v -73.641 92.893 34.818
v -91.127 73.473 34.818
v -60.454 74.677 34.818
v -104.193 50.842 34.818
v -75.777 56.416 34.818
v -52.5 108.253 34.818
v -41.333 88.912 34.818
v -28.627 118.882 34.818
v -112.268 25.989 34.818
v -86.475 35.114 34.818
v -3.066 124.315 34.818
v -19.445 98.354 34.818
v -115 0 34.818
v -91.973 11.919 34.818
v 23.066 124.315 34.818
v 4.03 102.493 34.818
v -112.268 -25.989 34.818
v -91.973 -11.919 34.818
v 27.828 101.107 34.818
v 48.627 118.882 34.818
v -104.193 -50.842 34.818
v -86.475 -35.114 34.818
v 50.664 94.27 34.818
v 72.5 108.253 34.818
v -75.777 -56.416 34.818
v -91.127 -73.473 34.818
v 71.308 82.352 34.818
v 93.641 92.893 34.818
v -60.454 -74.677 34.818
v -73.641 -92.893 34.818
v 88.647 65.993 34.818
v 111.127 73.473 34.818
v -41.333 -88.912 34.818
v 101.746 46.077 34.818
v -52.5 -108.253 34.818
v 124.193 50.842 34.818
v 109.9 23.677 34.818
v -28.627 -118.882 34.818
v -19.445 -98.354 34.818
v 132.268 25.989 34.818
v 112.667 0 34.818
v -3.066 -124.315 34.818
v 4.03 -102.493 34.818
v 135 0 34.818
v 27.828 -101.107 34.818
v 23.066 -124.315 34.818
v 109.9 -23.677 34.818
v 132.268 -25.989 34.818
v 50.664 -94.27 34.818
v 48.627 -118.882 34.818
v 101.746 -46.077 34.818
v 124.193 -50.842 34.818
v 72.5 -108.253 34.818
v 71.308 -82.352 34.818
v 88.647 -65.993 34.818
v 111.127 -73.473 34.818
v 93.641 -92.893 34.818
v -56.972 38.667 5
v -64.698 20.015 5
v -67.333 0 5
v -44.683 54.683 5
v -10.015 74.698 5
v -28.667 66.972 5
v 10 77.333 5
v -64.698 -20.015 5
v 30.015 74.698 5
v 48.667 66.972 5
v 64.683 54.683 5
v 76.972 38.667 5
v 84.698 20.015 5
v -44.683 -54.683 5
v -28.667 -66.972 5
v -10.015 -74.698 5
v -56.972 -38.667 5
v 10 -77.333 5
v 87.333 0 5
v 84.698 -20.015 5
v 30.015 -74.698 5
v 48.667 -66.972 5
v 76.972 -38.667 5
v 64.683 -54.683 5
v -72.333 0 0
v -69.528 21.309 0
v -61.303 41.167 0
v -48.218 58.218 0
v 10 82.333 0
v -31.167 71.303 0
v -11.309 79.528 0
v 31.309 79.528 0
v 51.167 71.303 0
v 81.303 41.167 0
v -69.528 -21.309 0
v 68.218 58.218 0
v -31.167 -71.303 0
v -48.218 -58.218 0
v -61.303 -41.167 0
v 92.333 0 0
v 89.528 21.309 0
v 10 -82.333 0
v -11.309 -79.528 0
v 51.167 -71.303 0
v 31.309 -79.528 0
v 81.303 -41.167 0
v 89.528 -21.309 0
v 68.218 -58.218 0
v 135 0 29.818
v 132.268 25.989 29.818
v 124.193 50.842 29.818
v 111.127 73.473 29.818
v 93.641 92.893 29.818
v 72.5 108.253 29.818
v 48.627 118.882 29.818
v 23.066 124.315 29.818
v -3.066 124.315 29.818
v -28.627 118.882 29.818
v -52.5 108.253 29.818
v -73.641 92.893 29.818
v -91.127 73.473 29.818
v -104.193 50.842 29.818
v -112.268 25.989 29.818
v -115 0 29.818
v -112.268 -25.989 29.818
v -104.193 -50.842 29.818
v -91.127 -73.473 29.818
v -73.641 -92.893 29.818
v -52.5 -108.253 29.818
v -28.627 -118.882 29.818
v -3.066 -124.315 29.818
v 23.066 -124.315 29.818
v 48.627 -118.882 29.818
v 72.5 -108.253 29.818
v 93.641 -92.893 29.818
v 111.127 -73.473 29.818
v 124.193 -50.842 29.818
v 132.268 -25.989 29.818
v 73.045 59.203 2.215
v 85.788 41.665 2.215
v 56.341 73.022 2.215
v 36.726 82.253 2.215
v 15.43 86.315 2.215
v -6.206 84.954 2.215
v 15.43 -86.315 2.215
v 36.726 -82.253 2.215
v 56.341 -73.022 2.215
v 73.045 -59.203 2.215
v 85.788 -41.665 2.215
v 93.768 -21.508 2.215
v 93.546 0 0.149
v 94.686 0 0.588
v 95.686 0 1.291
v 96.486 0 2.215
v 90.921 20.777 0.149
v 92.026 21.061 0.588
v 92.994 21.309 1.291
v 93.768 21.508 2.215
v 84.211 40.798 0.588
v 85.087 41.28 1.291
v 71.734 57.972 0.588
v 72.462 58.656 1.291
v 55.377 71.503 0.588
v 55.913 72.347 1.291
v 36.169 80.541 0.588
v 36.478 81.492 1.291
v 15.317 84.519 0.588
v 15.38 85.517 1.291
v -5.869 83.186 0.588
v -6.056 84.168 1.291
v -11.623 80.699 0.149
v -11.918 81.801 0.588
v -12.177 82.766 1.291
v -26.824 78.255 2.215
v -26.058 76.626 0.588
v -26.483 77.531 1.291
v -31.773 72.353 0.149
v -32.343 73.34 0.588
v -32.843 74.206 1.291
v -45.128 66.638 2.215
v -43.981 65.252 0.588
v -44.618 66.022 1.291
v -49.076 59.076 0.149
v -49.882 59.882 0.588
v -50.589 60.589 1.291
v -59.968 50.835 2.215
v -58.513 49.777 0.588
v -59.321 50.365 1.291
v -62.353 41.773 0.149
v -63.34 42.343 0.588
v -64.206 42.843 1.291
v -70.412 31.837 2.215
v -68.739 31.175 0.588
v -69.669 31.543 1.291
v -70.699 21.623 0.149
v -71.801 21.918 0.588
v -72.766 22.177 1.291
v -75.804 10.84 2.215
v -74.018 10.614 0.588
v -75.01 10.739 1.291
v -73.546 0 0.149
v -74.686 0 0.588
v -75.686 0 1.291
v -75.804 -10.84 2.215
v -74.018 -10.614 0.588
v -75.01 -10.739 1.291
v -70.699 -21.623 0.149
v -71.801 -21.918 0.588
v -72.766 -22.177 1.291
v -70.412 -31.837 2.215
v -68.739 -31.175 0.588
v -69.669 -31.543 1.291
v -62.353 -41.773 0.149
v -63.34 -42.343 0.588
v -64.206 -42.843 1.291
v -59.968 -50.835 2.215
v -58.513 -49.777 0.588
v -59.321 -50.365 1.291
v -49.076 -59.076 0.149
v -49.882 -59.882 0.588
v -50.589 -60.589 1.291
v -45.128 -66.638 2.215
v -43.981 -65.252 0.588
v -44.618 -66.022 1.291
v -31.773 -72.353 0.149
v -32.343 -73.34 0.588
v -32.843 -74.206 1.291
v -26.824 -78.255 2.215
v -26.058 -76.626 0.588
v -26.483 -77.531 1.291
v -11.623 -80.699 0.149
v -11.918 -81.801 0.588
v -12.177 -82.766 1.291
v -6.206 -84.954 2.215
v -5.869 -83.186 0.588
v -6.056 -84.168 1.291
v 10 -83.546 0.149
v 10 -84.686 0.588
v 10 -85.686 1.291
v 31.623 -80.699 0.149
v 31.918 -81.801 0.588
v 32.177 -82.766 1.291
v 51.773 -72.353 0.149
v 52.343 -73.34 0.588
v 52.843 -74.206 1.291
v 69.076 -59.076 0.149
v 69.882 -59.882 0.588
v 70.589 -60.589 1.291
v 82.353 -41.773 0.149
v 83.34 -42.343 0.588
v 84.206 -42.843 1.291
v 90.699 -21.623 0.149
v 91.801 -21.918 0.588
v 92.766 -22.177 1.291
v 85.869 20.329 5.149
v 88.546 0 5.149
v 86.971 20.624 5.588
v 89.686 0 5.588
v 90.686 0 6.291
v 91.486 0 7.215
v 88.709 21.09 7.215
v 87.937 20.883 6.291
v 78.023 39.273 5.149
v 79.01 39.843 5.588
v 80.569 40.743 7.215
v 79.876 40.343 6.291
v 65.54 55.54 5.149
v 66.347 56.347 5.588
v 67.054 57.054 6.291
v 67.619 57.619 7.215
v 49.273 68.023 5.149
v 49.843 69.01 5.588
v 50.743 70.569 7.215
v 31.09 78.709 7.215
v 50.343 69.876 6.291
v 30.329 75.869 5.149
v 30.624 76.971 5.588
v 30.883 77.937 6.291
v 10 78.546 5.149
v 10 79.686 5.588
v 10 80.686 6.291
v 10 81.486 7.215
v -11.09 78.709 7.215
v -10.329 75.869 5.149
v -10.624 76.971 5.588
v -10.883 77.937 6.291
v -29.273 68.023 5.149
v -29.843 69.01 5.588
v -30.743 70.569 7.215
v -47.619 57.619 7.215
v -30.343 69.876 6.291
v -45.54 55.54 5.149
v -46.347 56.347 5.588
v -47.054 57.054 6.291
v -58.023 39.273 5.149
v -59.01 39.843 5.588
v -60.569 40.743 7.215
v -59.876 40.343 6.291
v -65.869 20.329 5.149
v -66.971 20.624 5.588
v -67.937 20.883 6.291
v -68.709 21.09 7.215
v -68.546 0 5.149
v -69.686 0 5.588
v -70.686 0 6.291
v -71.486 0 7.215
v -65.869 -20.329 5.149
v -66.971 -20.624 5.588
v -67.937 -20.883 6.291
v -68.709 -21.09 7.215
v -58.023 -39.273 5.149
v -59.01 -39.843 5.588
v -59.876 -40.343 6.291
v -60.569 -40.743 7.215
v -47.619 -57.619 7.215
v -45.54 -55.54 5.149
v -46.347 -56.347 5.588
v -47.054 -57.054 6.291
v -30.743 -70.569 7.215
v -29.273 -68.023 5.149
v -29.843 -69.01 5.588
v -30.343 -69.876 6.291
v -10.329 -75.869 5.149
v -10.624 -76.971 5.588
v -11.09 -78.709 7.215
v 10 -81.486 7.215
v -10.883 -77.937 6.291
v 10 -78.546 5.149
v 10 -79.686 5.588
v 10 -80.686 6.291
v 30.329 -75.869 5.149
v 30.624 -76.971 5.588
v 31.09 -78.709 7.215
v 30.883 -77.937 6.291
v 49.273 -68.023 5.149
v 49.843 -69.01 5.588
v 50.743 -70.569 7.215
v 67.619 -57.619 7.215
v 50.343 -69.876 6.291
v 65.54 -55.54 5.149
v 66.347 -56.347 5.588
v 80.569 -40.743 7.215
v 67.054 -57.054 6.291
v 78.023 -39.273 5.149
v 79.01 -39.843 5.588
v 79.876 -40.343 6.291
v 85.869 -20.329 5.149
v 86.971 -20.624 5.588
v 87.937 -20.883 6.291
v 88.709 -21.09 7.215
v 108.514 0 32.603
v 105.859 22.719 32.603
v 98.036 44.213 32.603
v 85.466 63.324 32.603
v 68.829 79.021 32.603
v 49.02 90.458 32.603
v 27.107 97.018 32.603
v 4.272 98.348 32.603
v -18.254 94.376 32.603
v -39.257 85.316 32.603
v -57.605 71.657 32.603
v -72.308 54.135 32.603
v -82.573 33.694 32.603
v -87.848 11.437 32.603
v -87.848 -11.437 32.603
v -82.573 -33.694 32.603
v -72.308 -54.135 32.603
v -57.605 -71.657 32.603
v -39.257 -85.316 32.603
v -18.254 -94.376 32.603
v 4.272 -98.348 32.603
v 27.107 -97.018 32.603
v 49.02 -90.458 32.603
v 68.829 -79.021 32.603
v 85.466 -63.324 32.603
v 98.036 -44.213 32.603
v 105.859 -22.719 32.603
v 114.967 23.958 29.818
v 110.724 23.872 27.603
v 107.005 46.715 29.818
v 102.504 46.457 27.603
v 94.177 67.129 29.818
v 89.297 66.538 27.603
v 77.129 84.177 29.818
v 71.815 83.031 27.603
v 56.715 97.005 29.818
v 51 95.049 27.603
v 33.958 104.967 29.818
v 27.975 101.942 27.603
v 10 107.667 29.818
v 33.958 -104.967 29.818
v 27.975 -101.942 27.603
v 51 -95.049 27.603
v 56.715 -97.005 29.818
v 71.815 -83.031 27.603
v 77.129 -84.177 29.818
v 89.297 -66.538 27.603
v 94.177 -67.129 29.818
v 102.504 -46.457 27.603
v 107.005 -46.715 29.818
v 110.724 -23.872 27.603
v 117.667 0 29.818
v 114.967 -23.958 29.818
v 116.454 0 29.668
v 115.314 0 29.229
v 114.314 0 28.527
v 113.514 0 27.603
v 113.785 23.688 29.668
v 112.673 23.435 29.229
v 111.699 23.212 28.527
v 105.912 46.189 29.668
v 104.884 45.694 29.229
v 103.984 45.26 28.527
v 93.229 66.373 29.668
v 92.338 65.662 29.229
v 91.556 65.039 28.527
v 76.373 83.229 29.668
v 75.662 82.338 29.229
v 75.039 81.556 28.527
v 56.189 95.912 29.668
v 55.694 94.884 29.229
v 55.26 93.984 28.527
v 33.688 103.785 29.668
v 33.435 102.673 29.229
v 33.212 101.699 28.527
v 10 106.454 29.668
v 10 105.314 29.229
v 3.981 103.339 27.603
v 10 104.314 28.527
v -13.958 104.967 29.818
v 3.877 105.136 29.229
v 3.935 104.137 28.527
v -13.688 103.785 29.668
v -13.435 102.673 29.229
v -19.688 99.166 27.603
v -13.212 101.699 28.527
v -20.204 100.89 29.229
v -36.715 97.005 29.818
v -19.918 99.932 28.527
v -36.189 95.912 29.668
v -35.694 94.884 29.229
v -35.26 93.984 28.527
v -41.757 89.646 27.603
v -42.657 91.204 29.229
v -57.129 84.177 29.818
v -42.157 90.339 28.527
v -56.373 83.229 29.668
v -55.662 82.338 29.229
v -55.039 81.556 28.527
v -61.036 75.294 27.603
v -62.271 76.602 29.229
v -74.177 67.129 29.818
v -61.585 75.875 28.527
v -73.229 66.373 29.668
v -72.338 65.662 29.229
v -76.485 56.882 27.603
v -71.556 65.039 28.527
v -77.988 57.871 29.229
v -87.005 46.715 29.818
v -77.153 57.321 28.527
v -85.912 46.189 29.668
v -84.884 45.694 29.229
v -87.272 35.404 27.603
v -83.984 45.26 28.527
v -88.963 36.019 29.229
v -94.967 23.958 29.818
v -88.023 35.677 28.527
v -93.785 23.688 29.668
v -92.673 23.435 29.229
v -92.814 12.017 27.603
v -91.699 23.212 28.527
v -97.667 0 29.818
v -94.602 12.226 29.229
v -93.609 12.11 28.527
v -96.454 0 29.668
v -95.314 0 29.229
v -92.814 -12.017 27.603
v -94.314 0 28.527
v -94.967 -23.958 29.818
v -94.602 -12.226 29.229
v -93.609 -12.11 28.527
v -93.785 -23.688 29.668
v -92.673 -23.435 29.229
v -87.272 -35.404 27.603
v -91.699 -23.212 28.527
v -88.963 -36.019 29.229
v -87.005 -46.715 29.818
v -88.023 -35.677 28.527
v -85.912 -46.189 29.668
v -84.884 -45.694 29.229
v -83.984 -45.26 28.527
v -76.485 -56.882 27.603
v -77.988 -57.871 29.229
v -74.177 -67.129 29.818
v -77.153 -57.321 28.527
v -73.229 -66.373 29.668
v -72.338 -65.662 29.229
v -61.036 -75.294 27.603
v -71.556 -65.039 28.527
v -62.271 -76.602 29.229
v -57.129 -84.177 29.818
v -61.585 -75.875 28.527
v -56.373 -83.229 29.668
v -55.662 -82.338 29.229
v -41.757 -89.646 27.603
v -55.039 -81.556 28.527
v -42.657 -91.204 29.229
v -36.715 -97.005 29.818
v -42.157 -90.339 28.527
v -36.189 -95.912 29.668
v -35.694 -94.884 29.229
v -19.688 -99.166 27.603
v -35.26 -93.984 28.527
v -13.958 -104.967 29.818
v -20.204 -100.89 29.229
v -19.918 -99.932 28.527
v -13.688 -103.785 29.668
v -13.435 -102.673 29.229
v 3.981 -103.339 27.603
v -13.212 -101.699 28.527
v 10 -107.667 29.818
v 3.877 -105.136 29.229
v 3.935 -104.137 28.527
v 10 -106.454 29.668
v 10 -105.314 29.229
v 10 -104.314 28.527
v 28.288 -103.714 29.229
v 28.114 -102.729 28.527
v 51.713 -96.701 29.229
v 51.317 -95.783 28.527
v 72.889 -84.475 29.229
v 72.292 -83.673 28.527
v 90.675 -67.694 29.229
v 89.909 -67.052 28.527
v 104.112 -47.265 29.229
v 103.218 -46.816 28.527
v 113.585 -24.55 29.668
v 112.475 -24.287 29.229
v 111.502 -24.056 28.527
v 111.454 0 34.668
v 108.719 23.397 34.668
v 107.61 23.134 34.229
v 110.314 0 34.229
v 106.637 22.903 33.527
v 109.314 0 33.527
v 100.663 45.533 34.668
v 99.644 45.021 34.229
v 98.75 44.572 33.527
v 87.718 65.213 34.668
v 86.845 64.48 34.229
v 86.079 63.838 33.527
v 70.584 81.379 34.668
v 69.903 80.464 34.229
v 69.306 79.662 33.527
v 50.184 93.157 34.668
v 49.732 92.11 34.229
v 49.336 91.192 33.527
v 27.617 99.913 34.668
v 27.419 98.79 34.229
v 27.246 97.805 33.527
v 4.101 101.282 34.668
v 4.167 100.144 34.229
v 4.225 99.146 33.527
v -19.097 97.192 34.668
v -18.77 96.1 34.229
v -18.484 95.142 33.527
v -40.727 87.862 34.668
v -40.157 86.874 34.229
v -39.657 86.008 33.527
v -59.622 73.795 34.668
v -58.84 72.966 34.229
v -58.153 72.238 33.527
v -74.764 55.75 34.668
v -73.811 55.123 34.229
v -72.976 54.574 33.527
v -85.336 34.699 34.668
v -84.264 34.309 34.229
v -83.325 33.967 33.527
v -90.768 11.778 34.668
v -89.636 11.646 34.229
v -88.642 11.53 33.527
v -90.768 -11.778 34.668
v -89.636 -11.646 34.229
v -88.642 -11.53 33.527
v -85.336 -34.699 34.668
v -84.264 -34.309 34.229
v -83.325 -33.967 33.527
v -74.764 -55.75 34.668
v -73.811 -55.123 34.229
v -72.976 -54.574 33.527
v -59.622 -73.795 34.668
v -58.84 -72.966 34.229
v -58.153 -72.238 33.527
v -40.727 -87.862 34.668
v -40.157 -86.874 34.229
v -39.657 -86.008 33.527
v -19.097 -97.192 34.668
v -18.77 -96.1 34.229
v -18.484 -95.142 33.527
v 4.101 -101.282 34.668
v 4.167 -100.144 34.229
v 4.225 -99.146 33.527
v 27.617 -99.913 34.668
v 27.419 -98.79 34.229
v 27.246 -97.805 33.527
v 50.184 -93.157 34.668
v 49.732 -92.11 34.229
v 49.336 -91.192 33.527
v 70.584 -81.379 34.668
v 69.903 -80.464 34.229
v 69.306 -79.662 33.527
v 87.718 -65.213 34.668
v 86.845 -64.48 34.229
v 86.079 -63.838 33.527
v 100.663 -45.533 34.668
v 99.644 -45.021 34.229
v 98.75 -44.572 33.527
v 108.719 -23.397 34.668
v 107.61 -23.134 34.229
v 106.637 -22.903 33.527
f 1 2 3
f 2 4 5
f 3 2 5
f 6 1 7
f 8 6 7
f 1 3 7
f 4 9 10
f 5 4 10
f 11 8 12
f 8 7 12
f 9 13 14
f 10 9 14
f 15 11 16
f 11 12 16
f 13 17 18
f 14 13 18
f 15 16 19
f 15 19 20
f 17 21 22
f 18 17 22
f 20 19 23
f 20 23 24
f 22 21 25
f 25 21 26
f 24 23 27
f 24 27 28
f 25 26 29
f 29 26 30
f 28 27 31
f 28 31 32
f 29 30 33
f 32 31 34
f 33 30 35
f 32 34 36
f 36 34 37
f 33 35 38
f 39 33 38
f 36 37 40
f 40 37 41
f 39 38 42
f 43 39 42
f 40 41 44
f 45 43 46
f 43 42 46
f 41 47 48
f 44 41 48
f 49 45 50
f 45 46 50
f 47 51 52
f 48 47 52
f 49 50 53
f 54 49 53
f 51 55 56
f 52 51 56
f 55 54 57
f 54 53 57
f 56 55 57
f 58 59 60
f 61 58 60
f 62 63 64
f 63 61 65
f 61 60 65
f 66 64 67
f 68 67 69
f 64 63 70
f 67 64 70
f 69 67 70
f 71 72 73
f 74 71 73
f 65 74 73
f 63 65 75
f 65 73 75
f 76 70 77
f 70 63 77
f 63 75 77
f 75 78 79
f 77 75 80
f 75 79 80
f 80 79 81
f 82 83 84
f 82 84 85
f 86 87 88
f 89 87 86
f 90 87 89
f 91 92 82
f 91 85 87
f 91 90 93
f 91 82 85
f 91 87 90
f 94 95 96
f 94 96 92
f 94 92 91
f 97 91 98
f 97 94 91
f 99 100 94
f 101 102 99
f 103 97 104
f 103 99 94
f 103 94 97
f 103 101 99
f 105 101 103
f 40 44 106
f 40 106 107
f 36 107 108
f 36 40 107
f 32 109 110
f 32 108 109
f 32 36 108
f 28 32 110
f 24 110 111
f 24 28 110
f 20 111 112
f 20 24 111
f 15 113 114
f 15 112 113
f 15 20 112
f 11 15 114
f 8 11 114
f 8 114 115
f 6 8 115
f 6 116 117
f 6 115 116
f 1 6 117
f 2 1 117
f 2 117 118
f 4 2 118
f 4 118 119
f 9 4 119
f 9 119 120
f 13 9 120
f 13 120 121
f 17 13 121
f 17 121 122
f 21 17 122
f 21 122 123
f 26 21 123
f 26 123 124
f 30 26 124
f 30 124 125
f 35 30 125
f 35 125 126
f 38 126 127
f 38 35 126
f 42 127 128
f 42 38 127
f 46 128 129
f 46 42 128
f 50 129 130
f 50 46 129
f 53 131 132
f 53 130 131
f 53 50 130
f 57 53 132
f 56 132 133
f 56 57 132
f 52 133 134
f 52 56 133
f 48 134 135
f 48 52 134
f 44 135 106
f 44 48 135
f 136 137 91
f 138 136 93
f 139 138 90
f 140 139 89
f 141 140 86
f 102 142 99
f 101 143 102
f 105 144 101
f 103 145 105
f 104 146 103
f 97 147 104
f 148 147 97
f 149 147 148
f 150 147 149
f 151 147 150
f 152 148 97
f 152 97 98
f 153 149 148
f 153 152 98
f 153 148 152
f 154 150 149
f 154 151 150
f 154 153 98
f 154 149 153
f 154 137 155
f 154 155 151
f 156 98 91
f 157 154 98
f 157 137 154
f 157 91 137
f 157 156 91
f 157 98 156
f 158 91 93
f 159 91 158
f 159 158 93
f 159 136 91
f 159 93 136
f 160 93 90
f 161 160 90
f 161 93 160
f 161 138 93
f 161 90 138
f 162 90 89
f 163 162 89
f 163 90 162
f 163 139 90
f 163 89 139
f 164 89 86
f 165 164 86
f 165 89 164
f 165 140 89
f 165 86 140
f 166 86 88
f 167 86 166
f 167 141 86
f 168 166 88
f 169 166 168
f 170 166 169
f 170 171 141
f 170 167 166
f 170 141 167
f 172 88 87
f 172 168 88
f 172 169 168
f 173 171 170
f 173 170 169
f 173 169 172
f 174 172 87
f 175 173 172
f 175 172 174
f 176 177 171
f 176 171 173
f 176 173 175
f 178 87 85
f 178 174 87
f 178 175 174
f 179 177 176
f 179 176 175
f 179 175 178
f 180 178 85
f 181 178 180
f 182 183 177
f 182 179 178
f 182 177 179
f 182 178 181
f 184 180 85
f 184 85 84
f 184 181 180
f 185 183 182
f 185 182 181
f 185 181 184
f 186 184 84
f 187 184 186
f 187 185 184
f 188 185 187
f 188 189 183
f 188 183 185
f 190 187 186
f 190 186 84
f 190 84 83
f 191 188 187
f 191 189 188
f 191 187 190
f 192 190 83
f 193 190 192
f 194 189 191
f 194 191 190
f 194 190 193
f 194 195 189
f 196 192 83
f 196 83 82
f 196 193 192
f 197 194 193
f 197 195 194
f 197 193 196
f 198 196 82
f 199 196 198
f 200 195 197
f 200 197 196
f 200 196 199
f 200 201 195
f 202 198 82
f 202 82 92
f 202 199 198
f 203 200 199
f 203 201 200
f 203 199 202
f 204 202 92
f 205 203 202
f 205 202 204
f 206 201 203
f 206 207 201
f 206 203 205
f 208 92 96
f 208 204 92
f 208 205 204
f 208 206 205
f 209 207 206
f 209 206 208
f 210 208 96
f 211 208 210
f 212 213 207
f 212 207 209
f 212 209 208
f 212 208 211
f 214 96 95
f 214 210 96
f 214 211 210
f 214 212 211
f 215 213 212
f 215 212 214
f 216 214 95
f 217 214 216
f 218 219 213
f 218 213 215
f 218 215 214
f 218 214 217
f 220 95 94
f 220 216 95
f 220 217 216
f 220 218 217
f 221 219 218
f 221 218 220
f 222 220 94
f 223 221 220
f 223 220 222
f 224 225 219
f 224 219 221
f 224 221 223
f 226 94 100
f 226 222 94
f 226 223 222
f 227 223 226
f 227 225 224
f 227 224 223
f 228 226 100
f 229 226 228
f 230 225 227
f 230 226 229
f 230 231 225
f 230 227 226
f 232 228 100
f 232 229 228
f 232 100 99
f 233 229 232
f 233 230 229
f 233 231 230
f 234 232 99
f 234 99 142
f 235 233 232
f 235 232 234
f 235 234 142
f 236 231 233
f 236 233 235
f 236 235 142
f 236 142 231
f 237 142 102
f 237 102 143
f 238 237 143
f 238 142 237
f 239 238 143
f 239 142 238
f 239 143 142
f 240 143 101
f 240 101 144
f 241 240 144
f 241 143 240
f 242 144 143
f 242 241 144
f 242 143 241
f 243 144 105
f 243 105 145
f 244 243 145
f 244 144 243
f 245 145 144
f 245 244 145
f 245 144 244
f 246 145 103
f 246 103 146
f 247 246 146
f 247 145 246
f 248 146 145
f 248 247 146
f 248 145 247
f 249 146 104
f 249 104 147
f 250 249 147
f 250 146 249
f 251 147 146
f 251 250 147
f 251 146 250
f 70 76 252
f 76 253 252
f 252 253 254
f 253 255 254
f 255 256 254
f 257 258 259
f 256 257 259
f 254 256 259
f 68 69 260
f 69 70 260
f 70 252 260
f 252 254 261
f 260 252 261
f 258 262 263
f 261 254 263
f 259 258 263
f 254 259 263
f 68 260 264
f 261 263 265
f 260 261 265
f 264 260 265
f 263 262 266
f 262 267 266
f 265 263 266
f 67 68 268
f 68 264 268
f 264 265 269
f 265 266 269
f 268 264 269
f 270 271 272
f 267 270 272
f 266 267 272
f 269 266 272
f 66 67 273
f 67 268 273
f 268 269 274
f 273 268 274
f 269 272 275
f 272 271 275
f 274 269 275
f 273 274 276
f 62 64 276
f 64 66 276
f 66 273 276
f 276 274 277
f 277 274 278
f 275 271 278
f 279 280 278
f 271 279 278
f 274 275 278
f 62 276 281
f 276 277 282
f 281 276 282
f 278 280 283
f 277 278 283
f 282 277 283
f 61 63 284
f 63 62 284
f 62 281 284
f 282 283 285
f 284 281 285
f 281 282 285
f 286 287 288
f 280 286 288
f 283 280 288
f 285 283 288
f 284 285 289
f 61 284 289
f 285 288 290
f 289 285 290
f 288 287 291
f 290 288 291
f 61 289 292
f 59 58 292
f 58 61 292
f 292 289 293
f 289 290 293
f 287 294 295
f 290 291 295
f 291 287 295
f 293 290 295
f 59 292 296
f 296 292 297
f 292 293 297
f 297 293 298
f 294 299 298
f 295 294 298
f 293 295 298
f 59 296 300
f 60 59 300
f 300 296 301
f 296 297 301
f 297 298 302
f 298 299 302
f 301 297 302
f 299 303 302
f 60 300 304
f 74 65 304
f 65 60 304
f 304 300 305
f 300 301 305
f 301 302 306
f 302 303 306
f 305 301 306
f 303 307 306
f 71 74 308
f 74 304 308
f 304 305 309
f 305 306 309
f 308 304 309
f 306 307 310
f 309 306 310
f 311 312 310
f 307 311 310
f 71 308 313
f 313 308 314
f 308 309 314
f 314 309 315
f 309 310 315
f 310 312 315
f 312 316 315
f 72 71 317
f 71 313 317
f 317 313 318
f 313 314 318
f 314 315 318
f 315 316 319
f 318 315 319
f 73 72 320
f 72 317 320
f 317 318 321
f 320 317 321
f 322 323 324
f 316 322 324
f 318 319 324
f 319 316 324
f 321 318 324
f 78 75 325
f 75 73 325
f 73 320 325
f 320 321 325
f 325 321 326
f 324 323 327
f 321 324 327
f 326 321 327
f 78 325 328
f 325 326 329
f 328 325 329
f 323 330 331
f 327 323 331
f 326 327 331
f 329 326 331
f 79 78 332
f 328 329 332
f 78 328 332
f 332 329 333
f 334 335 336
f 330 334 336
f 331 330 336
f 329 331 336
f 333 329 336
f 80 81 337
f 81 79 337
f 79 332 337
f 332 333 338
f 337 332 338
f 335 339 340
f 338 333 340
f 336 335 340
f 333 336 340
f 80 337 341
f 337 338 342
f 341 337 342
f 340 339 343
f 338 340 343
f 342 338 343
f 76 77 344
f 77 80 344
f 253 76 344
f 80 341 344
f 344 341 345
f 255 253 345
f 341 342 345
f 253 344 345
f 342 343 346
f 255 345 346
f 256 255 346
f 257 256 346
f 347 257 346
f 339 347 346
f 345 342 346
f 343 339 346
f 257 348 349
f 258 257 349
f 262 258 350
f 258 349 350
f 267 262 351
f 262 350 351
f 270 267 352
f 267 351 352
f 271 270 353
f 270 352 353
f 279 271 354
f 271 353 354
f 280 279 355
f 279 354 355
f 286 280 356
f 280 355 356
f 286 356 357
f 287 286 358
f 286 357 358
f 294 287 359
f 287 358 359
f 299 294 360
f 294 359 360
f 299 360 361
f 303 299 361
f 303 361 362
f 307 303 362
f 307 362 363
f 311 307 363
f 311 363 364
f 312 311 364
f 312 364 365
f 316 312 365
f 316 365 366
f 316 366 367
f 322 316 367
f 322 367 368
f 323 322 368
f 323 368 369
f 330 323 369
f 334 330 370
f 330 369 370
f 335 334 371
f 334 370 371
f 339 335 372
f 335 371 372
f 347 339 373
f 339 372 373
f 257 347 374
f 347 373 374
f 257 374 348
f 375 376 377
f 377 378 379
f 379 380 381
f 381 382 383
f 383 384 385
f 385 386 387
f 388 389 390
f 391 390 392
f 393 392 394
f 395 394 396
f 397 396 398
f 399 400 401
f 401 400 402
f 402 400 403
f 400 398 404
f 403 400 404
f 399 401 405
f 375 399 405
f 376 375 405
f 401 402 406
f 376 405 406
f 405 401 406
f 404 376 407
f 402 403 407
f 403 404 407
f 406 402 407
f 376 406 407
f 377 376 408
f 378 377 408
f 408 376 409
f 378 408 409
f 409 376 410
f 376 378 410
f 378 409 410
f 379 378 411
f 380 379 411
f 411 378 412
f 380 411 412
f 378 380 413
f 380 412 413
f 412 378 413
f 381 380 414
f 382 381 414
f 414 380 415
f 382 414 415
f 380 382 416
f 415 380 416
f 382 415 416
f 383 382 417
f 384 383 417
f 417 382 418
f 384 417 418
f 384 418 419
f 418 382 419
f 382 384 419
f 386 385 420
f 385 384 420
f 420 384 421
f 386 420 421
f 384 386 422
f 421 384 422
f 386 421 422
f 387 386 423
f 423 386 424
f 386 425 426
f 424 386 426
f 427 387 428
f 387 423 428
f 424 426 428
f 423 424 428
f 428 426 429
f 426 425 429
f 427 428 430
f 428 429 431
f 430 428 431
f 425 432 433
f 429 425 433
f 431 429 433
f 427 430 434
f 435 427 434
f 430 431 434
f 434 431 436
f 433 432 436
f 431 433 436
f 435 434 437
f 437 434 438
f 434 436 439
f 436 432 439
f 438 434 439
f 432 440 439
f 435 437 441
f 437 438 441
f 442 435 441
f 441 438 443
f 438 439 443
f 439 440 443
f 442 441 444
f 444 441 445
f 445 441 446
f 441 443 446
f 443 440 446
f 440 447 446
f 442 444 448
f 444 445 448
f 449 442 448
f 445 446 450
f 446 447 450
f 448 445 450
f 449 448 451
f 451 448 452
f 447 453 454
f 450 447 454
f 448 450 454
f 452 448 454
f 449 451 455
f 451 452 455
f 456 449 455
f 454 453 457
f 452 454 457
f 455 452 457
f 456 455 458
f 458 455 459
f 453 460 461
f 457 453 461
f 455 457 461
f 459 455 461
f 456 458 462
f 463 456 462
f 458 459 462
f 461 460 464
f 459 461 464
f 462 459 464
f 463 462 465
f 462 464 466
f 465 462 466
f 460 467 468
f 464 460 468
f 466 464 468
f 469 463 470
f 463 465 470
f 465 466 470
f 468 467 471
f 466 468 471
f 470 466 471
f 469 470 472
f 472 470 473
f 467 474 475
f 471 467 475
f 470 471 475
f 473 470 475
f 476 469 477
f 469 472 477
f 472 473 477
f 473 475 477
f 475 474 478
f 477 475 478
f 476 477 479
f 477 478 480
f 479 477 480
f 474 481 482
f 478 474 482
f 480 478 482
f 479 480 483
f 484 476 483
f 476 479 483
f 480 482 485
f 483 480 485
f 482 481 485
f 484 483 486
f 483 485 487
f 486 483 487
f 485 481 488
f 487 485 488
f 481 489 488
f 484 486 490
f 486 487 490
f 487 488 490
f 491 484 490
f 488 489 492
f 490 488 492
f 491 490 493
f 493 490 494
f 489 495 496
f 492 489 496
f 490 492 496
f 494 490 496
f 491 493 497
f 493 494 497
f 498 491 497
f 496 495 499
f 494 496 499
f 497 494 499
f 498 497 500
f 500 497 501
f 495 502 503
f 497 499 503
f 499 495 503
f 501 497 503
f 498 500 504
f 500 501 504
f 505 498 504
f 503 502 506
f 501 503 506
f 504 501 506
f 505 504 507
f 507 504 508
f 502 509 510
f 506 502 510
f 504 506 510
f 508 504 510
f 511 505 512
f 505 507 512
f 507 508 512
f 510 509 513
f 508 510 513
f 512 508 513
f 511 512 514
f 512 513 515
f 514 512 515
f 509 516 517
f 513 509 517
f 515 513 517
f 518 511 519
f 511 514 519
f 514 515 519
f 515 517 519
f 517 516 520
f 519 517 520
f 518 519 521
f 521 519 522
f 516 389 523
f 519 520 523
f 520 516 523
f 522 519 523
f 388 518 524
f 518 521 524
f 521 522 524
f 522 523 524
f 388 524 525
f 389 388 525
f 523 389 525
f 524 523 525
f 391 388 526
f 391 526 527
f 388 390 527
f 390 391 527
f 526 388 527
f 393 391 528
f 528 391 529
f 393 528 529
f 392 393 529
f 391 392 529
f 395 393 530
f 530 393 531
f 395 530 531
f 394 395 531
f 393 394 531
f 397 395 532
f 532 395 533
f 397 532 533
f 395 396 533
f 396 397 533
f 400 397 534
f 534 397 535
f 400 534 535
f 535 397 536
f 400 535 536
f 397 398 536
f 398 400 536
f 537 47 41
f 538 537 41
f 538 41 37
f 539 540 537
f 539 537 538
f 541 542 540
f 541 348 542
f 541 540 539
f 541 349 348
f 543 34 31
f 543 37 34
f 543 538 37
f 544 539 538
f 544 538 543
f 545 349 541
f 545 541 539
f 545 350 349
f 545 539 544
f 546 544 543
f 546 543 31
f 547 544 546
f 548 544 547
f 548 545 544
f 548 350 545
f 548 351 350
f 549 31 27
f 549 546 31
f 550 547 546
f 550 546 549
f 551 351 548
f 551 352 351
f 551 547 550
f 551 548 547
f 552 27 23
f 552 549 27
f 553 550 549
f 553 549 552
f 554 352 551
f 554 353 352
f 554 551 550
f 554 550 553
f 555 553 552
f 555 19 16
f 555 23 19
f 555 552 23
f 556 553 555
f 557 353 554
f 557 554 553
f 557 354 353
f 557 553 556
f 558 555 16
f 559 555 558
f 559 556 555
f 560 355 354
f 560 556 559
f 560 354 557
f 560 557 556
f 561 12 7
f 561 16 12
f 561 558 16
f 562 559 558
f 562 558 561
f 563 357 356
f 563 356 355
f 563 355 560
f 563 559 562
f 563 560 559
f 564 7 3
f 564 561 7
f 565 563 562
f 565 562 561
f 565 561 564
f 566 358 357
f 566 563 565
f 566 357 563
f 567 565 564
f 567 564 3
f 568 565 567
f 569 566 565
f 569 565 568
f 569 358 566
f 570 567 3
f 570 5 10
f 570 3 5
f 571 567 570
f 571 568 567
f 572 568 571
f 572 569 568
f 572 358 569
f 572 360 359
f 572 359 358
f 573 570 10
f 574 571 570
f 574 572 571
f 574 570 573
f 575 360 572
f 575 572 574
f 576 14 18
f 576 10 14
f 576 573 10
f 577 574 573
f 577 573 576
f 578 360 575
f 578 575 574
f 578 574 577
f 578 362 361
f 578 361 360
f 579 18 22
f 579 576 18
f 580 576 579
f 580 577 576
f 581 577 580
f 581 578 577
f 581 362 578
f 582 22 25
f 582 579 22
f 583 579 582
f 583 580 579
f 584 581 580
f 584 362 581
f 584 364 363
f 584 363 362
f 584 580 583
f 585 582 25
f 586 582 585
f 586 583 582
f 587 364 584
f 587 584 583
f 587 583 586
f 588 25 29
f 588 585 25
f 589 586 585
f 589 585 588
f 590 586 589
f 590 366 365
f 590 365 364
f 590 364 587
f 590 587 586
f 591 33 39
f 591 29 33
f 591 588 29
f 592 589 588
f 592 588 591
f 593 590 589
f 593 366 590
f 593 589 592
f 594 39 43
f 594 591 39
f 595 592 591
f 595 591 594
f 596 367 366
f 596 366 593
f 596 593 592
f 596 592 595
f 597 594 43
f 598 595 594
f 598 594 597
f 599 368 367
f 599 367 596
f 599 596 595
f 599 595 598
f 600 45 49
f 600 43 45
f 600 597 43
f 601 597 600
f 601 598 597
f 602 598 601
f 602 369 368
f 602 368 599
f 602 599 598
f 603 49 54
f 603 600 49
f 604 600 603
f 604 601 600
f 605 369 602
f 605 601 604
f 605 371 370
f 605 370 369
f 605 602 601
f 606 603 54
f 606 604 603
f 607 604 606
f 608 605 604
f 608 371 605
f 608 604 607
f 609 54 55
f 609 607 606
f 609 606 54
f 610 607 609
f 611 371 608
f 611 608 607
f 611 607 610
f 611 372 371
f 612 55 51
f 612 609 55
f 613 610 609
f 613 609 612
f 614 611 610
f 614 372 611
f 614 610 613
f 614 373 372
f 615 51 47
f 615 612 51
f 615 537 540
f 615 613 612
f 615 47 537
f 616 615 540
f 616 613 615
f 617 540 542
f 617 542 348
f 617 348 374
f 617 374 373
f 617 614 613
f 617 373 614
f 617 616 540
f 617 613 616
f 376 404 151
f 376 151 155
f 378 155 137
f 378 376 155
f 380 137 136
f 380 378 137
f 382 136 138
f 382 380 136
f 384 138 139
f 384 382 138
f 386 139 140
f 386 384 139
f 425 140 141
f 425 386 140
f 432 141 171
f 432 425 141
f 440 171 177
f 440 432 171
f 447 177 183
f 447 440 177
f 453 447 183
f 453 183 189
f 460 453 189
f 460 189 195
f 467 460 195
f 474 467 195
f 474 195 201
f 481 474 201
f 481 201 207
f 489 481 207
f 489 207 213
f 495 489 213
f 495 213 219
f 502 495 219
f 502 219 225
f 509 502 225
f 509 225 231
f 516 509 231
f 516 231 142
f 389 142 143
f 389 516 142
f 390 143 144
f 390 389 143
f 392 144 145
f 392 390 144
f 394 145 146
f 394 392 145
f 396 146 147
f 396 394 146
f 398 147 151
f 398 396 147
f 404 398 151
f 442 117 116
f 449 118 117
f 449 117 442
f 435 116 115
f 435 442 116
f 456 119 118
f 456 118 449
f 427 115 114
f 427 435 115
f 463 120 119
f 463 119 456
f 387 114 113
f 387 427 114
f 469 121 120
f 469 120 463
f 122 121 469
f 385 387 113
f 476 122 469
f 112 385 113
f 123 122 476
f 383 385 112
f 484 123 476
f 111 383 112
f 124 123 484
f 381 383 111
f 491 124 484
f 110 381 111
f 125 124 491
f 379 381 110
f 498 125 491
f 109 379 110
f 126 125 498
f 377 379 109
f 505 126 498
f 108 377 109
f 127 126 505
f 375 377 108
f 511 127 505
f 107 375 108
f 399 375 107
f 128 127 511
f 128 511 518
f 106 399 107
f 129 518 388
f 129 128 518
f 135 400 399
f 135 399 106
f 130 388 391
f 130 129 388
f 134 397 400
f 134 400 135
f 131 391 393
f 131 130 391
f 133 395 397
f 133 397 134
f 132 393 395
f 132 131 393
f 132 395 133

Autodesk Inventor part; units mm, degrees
ref_plane "YZ Plane" through (0, 0, 0) normal (1, 0, 0) x (0, 1, 0)
ref_plane "XZ Plane" through (0, 0, 0) normal (0, 1, 0) x (-1, 0, 0)
ref_plane "XY Plane" through (0, 0, 0) normal (0, 0, 1) x (1, 0, 0)
sketch "Boceto3" plane through (0, 0, 0) normal (0, 0, 1) x (1, 0, 0)
  line L0 (0, 0) -> (82.3331, 0)
  line L1 (86.4856, 2.2148) -> (103.5144, 27.6027)
  line L2 (107.6669, 29.8175) -> (125, 29.8175)
  line L3 (125, 29.8175) -> (125, 34.8175)
  line L4 (125, 34.8175) -> (102.6669, 34.8175)
  line L5 (98.5144, 32.6027) -> (81.4856, 7.2148)
  line L6 (77.3331, 5) -> (0, 5)
  line L7 (0, 5) -> (0, 0)
  arc A0 (77.3331, 5) -> (81.4856, 7.2148) centre (77.3331, 10) ccw
  arc A1 (102.6669, 34.8175) -> (98.5144, 32.6027) centre (102.6669, 29.8175) ccw
  arc A2 (107.6669, 29.8175) -> (103.5144, 27.6027) centre (107.6669, 24.8175) ccw
  arc A3 (82.3331, 0) -> (86.4856, 2.2148) centre (82.3331, 5) ccw
  point P0 (85, 0)
  point P1 (100, 34.8175)
  point P2 (80, 5)
  dimension "d6" = 125
  dimension "d8" = 80
  dimension "d9" = 5
  dimension "d10" = 5
  dimension "d12" = 100
  dimension "d13" = 85
  dimension "d16" = 5
  dimension "d17" = 5
revolve "Revolución1" add sketch "Boceto3" angle 360 about axis through (0, 5, 0) along (0, -1, 0)
move or copy body "Desplazar cuerpo1" bodies to move or copy 1 copy no rotation origin (0, 0, 0) rotation axis (1, 0, 0) rotation angle 90
move or copy body "Desplazar cuerpo2" bodies to move or copy 1 copy no translate (10, 0, 0)
properties part number "plato" material "Porcelana, marfil"
